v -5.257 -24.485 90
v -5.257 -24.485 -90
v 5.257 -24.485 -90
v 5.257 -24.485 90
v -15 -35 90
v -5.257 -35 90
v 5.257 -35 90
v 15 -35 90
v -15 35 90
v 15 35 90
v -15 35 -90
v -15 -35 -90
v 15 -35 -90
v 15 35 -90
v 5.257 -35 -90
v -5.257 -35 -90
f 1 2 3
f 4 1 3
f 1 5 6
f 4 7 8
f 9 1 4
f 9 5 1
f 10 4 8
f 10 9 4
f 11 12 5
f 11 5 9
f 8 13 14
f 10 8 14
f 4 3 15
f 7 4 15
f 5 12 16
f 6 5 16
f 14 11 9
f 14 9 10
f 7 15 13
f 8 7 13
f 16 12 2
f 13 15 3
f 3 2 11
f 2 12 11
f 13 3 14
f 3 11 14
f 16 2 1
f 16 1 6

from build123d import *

# Parameters (mm, degrees)
MAINBODY_EXTRUDE_START = -90
PROJECTIONXY_SKETCH_W  = 30
PROJECTIONXY_SKETCH_H  = 70
MAINBODY_EXTRUDE_DEPTH = 180
TROUGH_CUT_DEPTH       = 98.724101428
TROUGH_CUT_DEPTH_BACK  = 98.724101428
TROUGH_SKETCH_W        = 10.514570696
TROUGH_SKETCH_H        = 10.514570696


with BuildPart() as part:
    # projectionXy_sketch → mainBody_extrude (new body)
    with BuildSketch(Plane.XY.offset(MAINBODY_EXTRUDE_START)):
        Rectangle(PROJECTIONXY_SKETCH_W, PROJECTIONXY_SKETCH_H)
    extrude(amount=MAINBODY_EXTRUDE_DEPTH)

    # trough_sketch → trough_cut (cut, two sides: drawn at the far end of the back side and taken through both)
    with BuildSketch(Plane(origin=(0, 0, 0), x_dir=(1, 0, 0), z_dir=(0, 0, -1)).offset(-TROUGH_CUT_DEPTH_BACK)):
        with Locations((0, 29.742714652)):
            Rectangle(TROUGH_SKETCH_W, TROUGH_SKETCH_H)
    extrude(amount=TROUGH_CUT_DEPTH + TROUGH_CUT_DEPTH_BACK, mode=Mode.SUBTRACT)


solid = part.part
